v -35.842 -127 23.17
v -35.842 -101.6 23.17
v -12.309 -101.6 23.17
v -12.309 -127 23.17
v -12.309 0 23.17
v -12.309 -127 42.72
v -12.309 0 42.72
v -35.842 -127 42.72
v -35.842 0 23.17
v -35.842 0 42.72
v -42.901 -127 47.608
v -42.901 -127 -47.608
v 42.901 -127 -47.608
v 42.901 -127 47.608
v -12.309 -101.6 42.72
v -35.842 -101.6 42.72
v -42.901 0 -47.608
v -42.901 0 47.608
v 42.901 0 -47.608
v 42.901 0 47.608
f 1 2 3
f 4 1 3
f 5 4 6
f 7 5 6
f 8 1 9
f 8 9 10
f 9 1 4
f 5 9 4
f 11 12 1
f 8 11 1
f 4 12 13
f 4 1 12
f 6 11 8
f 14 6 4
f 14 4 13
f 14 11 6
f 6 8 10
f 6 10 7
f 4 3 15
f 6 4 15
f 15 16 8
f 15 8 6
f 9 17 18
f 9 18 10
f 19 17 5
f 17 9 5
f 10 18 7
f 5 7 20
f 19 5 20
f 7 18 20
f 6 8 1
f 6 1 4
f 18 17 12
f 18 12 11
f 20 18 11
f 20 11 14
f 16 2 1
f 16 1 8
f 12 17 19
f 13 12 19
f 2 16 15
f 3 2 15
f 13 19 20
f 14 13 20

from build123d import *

# Parameters (mm, degrees)
F0_W     = 85.802584
F0_H     = 95.215522
F1_DEPTH = 127
F2_W     = 23.532353
F2_H     = 19.549951
F3_DEPTH = 127
F4_DEPTH = 25.4


with BuildPart() as f1:
    # F0 (on Front) → F1 (new body)
    with BuildSketch(Plane.XZ):
        Rectangle(F0_W, F0_H)
    extrude(amount=F1_DEPTH)

    # F2 (on face) → F3 (cut)
    with BuildSketch(Plane.XZ.offset(127)):
        with Locations((-24.075407, 32.945293)):
            Rectangle(F2_W, F2_H)
    extrude(amount=-F3_DEPTH, mode=Mode.SUBTRACT)


with BuildPart() as f4:
    # F2 (on face) → F4 (new body)
    with BuildSketch(Plane.XZ.offset(127)):
        with Locations((-24.075407, 32.945293)):
            Rectangle(F2_W, F2_H)
    extrude(amount=-F4_DEPTH)


solid = Compound([f1.part, f4.part])
